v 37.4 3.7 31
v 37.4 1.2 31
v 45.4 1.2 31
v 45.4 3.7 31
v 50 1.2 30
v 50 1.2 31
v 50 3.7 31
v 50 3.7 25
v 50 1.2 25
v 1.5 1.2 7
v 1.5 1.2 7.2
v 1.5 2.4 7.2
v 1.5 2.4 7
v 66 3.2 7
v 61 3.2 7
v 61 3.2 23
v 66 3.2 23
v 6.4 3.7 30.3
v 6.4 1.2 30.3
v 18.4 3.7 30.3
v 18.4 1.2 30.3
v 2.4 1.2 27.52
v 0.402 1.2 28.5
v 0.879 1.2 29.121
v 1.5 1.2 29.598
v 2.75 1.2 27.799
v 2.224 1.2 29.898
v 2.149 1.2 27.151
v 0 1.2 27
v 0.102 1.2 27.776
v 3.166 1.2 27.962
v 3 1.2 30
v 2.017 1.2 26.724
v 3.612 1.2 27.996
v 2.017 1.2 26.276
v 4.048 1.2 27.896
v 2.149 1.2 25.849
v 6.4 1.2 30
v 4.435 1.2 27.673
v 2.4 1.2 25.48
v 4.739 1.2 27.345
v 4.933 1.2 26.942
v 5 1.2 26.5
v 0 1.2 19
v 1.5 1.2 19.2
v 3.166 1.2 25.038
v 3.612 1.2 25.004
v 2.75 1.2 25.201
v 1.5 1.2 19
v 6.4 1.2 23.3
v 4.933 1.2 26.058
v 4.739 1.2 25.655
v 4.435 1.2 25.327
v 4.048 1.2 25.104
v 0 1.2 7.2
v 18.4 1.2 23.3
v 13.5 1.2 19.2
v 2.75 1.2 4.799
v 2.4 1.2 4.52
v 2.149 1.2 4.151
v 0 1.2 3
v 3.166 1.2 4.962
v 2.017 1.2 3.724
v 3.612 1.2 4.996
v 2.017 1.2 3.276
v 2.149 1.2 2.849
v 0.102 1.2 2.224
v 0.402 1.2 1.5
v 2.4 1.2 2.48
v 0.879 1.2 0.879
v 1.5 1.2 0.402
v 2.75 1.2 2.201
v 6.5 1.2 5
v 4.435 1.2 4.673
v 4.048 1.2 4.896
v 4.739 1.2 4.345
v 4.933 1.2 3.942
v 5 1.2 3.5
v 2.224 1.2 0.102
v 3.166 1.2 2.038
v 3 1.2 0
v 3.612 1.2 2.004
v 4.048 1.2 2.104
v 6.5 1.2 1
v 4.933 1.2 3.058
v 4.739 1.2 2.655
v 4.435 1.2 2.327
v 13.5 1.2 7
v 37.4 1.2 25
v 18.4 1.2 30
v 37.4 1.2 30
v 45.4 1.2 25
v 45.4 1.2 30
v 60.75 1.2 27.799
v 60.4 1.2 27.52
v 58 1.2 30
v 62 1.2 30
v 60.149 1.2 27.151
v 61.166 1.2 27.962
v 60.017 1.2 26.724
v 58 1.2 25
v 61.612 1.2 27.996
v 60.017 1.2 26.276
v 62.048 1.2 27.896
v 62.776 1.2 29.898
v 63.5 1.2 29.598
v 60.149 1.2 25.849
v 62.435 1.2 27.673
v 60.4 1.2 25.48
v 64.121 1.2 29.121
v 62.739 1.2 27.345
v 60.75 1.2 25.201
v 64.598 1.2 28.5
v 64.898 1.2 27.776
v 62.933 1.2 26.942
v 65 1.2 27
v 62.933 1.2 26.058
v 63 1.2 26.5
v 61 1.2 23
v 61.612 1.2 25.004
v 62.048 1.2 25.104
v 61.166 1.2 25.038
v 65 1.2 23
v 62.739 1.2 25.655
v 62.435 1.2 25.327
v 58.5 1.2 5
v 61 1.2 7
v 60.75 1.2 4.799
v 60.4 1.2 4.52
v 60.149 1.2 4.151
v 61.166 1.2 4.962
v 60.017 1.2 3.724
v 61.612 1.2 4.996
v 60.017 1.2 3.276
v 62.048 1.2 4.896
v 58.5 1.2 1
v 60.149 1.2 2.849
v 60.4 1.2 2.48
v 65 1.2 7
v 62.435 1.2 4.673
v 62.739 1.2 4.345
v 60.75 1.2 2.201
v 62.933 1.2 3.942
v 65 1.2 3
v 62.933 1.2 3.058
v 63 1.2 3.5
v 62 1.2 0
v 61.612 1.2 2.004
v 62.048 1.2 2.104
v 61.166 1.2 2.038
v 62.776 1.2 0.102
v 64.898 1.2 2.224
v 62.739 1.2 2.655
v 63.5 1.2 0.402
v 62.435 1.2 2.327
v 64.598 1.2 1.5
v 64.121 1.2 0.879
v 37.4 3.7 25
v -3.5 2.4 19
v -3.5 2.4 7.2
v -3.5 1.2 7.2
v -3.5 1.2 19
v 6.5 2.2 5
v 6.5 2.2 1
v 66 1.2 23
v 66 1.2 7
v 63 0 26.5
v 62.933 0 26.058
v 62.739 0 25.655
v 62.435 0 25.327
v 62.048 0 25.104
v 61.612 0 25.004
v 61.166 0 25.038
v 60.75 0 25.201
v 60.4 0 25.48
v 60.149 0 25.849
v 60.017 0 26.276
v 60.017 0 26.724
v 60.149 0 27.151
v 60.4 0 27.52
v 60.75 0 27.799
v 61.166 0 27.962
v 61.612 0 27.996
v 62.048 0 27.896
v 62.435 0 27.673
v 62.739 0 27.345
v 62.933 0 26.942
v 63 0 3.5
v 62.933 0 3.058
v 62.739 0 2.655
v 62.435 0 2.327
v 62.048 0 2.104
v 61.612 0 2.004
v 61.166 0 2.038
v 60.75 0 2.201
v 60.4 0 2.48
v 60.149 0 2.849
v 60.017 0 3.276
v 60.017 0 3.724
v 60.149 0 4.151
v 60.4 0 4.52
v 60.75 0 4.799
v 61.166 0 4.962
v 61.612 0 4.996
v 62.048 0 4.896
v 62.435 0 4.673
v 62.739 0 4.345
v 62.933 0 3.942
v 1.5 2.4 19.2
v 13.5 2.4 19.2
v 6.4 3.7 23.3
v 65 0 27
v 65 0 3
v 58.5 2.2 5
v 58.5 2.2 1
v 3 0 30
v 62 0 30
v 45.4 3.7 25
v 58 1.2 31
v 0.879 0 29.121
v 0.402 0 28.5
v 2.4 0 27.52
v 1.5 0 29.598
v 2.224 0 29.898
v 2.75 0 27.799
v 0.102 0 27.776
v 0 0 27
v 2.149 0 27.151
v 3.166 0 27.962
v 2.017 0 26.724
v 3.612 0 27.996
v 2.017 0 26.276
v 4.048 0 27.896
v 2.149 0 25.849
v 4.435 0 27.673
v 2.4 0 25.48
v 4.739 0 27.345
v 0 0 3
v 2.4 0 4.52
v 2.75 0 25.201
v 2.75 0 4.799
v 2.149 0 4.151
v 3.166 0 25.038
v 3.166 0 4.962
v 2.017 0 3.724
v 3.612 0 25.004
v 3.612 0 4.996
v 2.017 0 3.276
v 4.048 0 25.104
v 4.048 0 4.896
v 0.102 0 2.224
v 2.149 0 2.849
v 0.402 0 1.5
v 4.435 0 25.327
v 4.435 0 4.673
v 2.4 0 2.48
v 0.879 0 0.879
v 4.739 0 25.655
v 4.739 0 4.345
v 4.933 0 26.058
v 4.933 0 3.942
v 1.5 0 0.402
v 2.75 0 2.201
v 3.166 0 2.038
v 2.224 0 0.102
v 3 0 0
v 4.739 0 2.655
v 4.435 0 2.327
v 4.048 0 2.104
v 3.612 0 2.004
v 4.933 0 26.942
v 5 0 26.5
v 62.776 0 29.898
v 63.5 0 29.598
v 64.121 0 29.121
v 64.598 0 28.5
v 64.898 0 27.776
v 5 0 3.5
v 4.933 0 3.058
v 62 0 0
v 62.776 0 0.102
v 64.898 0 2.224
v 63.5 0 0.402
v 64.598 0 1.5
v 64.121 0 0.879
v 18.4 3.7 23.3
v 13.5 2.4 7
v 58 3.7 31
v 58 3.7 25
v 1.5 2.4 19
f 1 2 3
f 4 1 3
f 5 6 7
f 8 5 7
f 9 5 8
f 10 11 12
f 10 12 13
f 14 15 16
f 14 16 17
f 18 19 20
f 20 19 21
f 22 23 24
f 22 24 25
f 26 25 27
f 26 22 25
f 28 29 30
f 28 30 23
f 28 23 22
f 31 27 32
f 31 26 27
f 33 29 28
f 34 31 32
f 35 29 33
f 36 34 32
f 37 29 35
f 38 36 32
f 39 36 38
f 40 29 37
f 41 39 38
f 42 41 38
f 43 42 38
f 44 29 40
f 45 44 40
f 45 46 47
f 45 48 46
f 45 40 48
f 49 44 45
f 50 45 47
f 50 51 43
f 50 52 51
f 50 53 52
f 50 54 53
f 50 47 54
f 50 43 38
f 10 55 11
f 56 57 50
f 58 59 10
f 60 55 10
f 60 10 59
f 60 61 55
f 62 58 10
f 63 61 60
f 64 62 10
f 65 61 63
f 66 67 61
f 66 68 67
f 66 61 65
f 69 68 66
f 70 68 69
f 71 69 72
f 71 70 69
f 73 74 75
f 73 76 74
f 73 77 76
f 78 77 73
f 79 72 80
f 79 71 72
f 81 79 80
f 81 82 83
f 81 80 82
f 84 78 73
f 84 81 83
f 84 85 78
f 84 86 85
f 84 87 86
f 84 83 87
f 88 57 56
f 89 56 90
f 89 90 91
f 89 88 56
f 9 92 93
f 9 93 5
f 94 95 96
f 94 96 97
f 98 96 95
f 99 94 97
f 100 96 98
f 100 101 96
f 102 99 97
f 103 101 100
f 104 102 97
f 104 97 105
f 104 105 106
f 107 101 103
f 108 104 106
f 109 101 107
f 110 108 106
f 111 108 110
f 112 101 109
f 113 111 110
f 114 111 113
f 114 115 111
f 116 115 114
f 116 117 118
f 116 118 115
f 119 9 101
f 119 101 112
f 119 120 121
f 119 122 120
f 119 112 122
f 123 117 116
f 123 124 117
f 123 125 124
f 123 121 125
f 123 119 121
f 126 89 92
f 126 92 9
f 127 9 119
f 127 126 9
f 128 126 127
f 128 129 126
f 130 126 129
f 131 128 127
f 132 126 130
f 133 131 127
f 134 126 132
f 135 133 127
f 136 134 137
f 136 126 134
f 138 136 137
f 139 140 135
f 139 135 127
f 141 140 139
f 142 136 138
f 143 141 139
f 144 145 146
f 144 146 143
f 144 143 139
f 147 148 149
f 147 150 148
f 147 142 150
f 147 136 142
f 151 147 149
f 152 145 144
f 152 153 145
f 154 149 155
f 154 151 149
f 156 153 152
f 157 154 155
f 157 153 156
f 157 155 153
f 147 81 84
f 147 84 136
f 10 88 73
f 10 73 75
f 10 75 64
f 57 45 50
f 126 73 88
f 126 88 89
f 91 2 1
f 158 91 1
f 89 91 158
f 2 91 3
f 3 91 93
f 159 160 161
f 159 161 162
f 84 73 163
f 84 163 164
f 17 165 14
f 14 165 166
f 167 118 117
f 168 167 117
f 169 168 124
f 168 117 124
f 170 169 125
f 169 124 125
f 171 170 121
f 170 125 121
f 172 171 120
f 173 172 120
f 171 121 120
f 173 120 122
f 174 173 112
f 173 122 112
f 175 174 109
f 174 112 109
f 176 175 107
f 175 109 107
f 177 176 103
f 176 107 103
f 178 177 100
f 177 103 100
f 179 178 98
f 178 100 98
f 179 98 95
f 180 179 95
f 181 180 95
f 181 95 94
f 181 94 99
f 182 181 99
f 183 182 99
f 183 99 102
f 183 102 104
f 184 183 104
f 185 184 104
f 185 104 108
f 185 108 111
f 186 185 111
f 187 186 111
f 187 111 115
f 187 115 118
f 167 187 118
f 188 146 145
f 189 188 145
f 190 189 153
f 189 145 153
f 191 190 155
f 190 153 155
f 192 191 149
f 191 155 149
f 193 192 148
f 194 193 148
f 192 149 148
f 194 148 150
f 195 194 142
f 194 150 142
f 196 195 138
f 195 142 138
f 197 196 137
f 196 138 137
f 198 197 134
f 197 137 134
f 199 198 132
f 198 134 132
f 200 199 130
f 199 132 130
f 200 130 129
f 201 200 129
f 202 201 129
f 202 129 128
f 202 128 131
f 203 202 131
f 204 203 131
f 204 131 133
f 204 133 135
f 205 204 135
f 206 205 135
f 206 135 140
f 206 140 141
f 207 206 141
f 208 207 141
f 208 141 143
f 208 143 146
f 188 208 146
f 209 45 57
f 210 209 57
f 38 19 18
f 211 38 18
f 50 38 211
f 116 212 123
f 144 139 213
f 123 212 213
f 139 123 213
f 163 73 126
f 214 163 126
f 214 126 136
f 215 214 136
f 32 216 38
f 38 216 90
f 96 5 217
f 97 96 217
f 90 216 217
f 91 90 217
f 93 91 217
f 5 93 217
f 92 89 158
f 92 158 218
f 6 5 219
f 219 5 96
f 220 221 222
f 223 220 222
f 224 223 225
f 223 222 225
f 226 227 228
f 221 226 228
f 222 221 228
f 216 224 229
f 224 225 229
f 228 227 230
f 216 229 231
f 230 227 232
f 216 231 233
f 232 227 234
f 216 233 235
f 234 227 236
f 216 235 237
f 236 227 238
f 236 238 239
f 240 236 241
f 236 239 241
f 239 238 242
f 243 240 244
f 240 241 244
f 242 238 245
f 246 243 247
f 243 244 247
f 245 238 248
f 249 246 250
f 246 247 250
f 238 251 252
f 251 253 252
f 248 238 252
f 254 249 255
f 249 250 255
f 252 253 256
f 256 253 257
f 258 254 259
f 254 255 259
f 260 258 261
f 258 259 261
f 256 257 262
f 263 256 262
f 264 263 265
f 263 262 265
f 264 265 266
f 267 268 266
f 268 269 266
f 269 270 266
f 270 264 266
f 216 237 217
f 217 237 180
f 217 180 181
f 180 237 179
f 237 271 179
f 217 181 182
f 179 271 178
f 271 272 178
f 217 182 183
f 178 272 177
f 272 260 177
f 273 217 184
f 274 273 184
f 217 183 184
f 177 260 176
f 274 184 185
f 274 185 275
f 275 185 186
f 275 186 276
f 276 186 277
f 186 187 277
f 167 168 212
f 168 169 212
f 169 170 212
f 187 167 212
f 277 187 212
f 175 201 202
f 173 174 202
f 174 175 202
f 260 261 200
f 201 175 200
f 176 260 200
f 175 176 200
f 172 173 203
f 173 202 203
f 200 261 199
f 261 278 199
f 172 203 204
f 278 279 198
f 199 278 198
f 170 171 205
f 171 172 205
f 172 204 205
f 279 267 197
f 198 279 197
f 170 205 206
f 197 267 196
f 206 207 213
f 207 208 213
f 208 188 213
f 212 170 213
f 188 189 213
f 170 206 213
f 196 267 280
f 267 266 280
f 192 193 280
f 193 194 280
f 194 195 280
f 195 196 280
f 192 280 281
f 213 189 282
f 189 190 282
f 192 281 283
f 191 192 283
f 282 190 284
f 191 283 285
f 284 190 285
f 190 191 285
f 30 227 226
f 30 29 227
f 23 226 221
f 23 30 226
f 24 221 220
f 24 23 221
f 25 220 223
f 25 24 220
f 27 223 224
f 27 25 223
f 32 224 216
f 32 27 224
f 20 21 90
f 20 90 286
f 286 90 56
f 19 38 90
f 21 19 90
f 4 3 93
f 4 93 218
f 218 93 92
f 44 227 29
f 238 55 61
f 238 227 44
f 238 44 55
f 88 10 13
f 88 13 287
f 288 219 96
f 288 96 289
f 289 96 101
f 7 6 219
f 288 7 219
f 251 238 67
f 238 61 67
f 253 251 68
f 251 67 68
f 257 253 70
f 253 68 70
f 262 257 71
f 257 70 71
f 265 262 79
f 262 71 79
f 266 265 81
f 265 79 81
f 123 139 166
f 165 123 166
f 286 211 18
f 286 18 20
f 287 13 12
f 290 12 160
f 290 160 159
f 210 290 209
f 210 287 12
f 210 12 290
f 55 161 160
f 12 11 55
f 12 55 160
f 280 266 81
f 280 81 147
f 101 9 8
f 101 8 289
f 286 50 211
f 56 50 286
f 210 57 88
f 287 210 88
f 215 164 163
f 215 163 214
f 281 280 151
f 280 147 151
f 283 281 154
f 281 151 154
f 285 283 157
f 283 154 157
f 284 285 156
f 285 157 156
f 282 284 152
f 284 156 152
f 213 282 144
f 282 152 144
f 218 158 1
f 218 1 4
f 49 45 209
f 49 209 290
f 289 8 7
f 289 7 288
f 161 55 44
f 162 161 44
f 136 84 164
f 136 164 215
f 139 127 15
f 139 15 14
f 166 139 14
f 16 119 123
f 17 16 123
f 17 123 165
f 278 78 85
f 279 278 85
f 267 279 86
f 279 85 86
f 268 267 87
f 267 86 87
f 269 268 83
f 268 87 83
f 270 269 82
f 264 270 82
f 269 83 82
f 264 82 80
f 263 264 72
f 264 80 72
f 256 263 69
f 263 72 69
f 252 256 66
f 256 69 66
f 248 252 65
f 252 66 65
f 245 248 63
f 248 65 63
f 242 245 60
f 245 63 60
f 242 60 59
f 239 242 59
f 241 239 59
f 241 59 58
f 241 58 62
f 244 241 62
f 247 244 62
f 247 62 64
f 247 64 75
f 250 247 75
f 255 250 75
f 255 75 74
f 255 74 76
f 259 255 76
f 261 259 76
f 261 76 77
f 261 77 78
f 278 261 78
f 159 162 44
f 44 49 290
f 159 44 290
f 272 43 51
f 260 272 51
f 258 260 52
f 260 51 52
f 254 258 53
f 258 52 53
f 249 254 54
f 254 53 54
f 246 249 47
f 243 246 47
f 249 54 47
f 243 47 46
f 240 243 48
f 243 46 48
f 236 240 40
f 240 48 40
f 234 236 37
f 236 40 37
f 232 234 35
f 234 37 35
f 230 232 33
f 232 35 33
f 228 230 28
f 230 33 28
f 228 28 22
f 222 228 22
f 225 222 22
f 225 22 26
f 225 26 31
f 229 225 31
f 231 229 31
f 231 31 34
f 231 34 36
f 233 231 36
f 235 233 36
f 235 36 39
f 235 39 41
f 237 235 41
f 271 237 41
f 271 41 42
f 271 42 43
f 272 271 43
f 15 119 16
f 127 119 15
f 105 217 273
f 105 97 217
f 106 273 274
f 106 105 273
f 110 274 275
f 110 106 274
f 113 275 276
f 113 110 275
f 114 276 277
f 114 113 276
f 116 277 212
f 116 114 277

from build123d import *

# Parameters (mm, degrees)
SKETCH1_W           = 65
SKETCH1_H           = 30
BOSS_EXTRUDE1_DEPTH = 1.2
SKETCH2_R           = 1.5
CUT_EXTRUDE1_DEPTH  = 2.2
FILLET1_R           = 3
SKETCH3_W           = 12
SKETCH3_H           = 12.2
BOSS_EXTRUDE2_DEPTH = 1.2
SKETCH4_W           = 11.8
SKETCH4_H           = 1.2
BOSS_EXTRUDE3_DEPTH = 5
SKETCH5_W           = 12
SKETCH5_H           = 7
BOSS_EXTRUDE4_DEPTH = 2.5
SKETCH6_W           = 8
SKETCH6_H           = 6
BOSS_EXTRUDE5_DEPTH = 2.5
SKETCH7_W           = 5
SKETCH7_H           = 16
BOSS_EXTRUDE6_DEPTH = 2
SKETCH8_W           = 52
SKETCH8_H           = 4
BOSS_EXTRUDE7_DEPTH = 1


with BuildPart() as part:
    # Sketch1 → Boss-Extrude1 (new body)
    with BuildSketch(Plane(origin=(0, 0, 0), x_dir=(1, 0, 0), z_dir=(0, 1, 0))):
        with Locations((32.5, -15)):
            Rectangle(SKETCH1_W, SKETCH1_H)
    extrude(amount=BOSS_EXTRUDE1_DEPTH)

    # Sketch2 → Cut-Extrude1 (cut, through all)
    with BuildSketch(Plane(origin=(0, 1.2, 0), x_dir=(1, 0, 0), z_dir=(0, 1, 0))):
        with Locations((3.5, -26.5)):
            Circle(SKETCH2_R)
        with Locations((61.5, -26.5)):
            Circle(SKETCH2_R)
        with Locations((61.5, -3.5)):
            Circle(SKETCH2_R)
        with Locations((3.5, -3.5)):
            Circle(SKETCH2_R)
    extrude(amount=-CUT_EXTRUDE1_DEPTH, mode=Mode.SUBTRACT)

    # Fillet1
    fillet1_edges = [part.edges().sort_by_distance(p)[0] for p in [
        (0, 0.6, 0),
        (65, 0.6, 0),
        (65, 0.6, 30),
        (0, 0.6, 30),
    ]]
    fillet(fillet1_edges, radius=FILLET1_R)

    # Sketch3 → Boss-Extrude2 (add)
    with BuildSketch(Plane(origin=(0, 1.2, 0), x_dir=(1, 0, 0), z_dir=(0, 1, 0))):
        with Locations((7.5, -13.1)):
            Rectangle(SKETCH3_W, SKETCH3_H)
    extrude(amount=BOSS_EXTRUDE2_DEPTH)

    # Sketch4 → Boss-Extrude3 (add)
    with BuildSketch(Plane.ZY.offset(-1.5)):
        with Locations((13.1, 1.8)):
            Rectangle(SKETCH4_W, SKETCH4_H)
    extrude(amount=BOSS_EXTRUDE3_DEPTH)

    # Sketch5 → Boss-Extrude4 (add)
    with BuildSketch(Plane(origin=(0, 1.2, 0), x_dir=(1, 0, 0), z_dir=(0, 1, 0))):
        with Locations((12.4, -26.8)):
            Rectangle(SKETCH5_W, SKETCH5_H)
    extrude(amount=BOSS_EXTRUDE4_DEPTH)

    # Sketch6 → Boss-Extrude5 (add)
    with BuildSketch(Plane(origin=(0, 1.2, 0), x_dir=(1, 0, 0), z_dir=(0, 1, 0))):
        with Locations((41.4, -28)):
            Rectangle(SKETCH6_W, SKETCH6_H)
        with Locations((54, -28)):
            Rectangle(SKETCH6_W, SKETCH6_H)
    extrude(amount=BOSS_EXTRUDE5_DEPTH)

    # Sketch7 → Boss-Extrude6 (add)
    with BuildSketch(Plane(origin=(0, 1.2, 0), x_dir=(1, 0, 0), z_dir=(0, 1, 0))):
        with Locations((63.5, -15)):
            Rectangle(SKETCH7_W, SKETCH7_H)
    extrude(amount=BOSS_EXTRUDE6_DEPTH)

    # Sketch8 → Boss-Extrude7 (add)
    with BuildSketch(Plane(origin=(0, 1.2, 0), x_dir=(1, 0, 0), z_dir=(0, 1, 0))):
        with Locations((32.5, -3)):
            Rectangle(SKETCH8_W, SKETCH8_H)
    extrude(amount=BOSS_EXTRUDE7_DEPTH)


solid = part.part
